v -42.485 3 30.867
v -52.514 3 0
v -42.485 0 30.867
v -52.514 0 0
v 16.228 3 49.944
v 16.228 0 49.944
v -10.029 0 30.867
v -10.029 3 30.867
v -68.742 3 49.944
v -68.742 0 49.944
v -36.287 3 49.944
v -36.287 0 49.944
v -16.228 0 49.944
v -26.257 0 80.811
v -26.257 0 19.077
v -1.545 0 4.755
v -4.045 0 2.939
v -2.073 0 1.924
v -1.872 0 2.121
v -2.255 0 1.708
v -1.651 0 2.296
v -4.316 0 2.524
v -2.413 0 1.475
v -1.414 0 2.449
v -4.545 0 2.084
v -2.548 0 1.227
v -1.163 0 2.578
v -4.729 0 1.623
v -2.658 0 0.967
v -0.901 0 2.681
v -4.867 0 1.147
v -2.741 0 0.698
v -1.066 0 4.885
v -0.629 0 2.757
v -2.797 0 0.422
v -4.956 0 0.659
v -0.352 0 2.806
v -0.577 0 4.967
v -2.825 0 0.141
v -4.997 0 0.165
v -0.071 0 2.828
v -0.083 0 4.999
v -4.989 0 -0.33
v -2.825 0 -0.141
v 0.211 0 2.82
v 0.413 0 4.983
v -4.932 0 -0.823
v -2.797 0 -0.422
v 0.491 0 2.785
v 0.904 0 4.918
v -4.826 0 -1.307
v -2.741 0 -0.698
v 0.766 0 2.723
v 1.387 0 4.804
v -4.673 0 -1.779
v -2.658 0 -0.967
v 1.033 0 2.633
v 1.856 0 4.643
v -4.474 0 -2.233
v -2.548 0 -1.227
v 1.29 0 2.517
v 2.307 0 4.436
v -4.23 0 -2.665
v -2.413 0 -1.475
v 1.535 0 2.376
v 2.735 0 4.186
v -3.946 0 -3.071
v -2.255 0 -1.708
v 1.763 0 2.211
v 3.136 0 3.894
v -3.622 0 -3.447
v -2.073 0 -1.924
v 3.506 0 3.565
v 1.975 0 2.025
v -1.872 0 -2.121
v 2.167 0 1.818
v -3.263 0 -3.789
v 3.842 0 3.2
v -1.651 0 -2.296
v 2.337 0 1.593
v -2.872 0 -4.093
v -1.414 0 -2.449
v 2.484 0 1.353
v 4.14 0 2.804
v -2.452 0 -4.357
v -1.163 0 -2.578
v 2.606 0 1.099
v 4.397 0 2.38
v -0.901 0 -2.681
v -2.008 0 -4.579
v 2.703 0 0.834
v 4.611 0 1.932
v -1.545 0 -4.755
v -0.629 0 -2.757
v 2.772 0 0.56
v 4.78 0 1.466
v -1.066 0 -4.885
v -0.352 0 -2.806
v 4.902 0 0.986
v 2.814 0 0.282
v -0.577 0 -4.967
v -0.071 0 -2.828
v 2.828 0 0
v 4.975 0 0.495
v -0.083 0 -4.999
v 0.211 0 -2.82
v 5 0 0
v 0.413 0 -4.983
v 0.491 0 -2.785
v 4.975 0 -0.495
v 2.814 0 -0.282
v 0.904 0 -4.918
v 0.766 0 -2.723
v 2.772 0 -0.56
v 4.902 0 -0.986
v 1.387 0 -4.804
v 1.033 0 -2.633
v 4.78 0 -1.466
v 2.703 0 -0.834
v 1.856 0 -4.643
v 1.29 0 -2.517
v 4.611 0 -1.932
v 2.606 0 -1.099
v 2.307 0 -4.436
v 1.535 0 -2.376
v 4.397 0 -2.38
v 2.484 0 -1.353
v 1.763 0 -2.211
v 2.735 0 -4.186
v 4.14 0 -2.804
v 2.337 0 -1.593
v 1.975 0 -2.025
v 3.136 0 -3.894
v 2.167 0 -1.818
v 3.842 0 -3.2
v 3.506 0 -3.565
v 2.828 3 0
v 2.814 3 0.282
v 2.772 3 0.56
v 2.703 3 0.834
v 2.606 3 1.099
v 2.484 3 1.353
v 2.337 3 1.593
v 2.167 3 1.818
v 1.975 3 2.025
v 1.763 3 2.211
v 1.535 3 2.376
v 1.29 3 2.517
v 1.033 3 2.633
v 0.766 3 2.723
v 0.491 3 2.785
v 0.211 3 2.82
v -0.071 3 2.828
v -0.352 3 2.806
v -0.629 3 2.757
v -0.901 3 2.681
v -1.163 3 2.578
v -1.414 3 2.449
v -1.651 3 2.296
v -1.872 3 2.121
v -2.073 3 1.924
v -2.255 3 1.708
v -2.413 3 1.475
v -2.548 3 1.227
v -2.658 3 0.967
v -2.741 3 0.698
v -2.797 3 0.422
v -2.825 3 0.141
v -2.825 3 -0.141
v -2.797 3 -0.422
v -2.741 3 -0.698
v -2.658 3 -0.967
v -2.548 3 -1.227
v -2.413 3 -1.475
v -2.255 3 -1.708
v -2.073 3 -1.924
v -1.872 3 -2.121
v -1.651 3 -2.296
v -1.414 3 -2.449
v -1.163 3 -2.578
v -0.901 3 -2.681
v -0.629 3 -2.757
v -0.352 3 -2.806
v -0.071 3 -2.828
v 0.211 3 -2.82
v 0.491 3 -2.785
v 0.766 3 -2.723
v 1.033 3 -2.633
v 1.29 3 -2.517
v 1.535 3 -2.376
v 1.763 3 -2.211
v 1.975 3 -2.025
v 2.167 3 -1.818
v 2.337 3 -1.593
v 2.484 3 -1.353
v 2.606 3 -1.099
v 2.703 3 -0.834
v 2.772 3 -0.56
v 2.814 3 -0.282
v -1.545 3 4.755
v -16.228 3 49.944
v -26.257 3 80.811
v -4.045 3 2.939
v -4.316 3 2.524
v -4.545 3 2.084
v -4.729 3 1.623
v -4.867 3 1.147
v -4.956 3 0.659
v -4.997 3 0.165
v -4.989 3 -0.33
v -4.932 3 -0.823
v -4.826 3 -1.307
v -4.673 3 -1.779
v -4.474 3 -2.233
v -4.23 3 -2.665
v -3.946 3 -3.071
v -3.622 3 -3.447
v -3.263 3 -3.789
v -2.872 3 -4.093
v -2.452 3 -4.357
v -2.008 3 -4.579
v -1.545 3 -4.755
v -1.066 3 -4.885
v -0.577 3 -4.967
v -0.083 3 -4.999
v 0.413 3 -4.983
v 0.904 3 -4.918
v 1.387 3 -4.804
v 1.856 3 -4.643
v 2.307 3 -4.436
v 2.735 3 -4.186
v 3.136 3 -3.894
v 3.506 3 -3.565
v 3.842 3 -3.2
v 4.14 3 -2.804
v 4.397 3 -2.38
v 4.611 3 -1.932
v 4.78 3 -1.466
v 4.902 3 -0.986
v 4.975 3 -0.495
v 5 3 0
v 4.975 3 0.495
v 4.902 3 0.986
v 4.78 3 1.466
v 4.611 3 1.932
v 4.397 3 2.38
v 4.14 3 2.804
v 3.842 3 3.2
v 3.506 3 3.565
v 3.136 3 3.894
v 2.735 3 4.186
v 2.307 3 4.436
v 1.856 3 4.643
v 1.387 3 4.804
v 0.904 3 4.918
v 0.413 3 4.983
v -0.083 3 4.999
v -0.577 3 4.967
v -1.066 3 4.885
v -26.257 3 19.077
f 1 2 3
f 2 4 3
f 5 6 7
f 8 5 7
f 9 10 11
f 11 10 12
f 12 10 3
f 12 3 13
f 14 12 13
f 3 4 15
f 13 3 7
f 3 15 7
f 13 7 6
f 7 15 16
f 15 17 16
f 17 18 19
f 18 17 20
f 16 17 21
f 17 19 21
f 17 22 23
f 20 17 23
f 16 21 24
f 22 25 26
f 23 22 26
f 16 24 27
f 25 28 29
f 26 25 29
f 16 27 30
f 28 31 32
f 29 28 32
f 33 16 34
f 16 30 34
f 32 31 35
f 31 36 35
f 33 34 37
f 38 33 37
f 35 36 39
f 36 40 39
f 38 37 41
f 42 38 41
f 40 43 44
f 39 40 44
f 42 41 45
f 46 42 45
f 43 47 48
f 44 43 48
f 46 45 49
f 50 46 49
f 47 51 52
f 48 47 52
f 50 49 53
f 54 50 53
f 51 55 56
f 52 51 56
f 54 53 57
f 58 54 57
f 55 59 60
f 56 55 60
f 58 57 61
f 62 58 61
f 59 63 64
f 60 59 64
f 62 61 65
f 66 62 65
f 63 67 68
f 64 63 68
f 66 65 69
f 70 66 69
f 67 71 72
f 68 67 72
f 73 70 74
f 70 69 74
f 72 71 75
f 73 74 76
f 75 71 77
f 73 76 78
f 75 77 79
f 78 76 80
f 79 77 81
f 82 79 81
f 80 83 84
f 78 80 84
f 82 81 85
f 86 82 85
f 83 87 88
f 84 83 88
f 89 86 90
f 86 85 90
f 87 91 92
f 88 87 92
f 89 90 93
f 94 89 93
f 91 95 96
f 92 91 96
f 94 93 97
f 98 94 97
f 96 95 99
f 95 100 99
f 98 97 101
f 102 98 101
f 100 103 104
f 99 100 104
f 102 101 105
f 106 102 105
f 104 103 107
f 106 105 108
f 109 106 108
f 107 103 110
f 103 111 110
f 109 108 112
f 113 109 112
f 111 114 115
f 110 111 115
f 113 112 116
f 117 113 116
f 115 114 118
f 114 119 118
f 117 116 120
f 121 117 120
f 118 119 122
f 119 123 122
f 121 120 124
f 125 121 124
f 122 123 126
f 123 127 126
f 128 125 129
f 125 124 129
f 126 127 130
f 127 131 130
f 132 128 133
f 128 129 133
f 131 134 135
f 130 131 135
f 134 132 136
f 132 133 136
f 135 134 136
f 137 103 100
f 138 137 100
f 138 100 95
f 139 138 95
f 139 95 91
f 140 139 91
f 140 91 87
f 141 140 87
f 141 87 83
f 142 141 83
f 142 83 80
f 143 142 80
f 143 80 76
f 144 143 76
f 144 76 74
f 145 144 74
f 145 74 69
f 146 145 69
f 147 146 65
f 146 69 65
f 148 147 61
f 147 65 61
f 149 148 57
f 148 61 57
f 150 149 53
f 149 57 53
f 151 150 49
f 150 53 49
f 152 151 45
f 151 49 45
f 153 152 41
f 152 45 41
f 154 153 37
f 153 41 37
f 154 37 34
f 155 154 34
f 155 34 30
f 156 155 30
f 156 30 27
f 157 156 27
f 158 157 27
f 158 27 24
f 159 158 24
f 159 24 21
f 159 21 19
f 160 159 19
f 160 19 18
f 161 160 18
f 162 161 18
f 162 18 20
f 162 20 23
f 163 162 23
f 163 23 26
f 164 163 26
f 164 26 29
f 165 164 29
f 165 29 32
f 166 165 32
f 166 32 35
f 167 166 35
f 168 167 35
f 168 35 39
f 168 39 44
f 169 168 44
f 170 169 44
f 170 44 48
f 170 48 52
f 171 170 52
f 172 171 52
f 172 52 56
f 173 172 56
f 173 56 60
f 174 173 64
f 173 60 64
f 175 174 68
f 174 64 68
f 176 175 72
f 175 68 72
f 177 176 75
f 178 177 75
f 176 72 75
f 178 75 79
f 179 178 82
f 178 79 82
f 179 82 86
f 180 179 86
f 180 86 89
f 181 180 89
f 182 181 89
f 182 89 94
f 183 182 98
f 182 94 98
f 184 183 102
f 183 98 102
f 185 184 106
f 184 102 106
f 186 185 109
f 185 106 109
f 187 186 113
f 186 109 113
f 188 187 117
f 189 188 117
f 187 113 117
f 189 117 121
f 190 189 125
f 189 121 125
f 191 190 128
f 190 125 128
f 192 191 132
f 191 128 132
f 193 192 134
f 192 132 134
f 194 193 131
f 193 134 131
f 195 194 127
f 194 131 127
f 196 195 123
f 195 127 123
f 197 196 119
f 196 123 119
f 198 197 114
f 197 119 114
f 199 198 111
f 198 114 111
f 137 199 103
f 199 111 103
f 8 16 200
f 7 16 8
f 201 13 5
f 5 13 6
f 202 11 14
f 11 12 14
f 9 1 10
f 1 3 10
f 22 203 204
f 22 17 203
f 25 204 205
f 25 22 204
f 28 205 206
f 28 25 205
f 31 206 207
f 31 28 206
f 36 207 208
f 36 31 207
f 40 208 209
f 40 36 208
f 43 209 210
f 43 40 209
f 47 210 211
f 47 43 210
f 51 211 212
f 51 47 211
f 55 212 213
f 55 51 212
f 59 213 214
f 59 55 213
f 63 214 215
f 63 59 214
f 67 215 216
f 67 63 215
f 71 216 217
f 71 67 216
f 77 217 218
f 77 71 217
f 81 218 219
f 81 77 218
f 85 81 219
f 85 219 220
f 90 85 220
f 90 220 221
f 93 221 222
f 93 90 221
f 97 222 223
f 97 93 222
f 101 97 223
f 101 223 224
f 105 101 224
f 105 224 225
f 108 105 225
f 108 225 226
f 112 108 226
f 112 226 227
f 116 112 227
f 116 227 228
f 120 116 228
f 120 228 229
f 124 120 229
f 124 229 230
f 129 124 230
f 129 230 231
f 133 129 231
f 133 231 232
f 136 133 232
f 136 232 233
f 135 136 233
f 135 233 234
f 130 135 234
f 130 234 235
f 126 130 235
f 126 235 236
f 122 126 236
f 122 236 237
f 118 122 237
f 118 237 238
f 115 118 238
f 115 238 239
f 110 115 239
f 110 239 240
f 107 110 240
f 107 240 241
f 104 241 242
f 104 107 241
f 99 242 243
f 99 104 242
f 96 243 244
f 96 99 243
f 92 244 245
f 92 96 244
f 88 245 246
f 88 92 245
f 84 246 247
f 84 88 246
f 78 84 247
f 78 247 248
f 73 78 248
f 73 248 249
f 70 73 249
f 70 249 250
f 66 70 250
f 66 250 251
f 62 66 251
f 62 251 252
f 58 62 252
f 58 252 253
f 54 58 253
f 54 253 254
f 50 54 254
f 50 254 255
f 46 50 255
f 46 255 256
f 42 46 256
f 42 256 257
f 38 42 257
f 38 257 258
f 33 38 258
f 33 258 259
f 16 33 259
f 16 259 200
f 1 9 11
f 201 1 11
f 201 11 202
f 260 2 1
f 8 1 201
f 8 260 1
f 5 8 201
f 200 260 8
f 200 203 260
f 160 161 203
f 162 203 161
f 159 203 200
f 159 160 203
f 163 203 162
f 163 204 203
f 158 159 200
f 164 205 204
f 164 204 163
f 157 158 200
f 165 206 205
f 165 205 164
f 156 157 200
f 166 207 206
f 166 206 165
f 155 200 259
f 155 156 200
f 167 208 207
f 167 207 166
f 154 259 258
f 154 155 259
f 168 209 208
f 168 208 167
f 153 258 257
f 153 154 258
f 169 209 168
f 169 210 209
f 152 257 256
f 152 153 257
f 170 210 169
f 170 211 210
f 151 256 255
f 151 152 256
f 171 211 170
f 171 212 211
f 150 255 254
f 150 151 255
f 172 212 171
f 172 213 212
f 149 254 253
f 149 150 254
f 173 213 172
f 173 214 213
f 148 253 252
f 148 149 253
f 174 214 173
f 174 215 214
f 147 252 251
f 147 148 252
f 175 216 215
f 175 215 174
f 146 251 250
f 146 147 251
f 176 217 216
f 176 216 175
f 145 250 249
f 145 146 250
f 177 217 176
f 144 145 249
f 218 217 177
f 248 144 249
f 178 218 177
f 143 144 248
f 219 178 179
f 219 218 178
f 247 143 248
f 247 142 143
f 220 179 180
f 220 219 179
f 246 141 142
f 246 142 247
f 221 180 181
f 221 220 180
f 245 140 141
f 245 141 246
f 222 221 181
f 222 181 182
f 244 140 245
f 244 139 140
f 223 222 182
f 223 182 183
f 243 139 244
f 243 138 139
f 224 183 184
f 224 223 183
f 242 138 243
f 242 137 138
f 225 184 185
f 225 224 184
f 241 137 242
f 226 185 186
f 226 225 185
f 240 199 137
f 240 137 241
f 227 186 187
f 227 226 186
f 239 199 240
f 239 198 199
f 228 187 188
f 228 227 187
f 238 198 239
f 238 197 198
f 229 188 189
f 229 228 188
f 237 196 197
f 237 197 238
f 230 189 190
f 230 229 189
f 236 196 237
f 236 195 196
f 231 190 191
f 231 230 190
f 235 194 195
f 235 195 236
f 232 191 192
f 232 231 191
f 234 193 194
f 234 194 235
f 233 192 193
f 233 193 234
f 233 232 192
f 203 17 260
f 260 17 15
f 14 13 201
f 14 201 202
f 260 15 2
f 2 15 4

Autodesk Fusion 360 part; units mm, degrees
sketch "草图1" plane through (0, 0, 0) normal (0, 1, 0) x (1, 0, 0)
  line L0 (-52.5144, 0) -> (-26.2572, -80.8114)
  line L1 (0, 0) -> (-26.2572, -80.8114)
  line L2 (0, 0) -> (-68.7423, -49.9442)
  line L3 (-68.7423, -49.9442) -> (16.2279, -49.9442)
  line L4 (16.2279, -49.9442) -> (-52.5144, 0)
  circle A0 centre (0, 0) radius 5
  circle A1 centre (0, 0) radius 2.8284
  point P0 (-26.2572, -36.14)
extrude "拉伸1" add sketch "草图1" along normal blind 3 contours L0 L2 L4 | L0 L1 L2 L3 L4 | L0 L2 L3 | L1 L2 L4 A0 | L0 L1 L3 | L1 L2 A0 A1 | L1 L2 A0 A1 | L1 L3 L4
